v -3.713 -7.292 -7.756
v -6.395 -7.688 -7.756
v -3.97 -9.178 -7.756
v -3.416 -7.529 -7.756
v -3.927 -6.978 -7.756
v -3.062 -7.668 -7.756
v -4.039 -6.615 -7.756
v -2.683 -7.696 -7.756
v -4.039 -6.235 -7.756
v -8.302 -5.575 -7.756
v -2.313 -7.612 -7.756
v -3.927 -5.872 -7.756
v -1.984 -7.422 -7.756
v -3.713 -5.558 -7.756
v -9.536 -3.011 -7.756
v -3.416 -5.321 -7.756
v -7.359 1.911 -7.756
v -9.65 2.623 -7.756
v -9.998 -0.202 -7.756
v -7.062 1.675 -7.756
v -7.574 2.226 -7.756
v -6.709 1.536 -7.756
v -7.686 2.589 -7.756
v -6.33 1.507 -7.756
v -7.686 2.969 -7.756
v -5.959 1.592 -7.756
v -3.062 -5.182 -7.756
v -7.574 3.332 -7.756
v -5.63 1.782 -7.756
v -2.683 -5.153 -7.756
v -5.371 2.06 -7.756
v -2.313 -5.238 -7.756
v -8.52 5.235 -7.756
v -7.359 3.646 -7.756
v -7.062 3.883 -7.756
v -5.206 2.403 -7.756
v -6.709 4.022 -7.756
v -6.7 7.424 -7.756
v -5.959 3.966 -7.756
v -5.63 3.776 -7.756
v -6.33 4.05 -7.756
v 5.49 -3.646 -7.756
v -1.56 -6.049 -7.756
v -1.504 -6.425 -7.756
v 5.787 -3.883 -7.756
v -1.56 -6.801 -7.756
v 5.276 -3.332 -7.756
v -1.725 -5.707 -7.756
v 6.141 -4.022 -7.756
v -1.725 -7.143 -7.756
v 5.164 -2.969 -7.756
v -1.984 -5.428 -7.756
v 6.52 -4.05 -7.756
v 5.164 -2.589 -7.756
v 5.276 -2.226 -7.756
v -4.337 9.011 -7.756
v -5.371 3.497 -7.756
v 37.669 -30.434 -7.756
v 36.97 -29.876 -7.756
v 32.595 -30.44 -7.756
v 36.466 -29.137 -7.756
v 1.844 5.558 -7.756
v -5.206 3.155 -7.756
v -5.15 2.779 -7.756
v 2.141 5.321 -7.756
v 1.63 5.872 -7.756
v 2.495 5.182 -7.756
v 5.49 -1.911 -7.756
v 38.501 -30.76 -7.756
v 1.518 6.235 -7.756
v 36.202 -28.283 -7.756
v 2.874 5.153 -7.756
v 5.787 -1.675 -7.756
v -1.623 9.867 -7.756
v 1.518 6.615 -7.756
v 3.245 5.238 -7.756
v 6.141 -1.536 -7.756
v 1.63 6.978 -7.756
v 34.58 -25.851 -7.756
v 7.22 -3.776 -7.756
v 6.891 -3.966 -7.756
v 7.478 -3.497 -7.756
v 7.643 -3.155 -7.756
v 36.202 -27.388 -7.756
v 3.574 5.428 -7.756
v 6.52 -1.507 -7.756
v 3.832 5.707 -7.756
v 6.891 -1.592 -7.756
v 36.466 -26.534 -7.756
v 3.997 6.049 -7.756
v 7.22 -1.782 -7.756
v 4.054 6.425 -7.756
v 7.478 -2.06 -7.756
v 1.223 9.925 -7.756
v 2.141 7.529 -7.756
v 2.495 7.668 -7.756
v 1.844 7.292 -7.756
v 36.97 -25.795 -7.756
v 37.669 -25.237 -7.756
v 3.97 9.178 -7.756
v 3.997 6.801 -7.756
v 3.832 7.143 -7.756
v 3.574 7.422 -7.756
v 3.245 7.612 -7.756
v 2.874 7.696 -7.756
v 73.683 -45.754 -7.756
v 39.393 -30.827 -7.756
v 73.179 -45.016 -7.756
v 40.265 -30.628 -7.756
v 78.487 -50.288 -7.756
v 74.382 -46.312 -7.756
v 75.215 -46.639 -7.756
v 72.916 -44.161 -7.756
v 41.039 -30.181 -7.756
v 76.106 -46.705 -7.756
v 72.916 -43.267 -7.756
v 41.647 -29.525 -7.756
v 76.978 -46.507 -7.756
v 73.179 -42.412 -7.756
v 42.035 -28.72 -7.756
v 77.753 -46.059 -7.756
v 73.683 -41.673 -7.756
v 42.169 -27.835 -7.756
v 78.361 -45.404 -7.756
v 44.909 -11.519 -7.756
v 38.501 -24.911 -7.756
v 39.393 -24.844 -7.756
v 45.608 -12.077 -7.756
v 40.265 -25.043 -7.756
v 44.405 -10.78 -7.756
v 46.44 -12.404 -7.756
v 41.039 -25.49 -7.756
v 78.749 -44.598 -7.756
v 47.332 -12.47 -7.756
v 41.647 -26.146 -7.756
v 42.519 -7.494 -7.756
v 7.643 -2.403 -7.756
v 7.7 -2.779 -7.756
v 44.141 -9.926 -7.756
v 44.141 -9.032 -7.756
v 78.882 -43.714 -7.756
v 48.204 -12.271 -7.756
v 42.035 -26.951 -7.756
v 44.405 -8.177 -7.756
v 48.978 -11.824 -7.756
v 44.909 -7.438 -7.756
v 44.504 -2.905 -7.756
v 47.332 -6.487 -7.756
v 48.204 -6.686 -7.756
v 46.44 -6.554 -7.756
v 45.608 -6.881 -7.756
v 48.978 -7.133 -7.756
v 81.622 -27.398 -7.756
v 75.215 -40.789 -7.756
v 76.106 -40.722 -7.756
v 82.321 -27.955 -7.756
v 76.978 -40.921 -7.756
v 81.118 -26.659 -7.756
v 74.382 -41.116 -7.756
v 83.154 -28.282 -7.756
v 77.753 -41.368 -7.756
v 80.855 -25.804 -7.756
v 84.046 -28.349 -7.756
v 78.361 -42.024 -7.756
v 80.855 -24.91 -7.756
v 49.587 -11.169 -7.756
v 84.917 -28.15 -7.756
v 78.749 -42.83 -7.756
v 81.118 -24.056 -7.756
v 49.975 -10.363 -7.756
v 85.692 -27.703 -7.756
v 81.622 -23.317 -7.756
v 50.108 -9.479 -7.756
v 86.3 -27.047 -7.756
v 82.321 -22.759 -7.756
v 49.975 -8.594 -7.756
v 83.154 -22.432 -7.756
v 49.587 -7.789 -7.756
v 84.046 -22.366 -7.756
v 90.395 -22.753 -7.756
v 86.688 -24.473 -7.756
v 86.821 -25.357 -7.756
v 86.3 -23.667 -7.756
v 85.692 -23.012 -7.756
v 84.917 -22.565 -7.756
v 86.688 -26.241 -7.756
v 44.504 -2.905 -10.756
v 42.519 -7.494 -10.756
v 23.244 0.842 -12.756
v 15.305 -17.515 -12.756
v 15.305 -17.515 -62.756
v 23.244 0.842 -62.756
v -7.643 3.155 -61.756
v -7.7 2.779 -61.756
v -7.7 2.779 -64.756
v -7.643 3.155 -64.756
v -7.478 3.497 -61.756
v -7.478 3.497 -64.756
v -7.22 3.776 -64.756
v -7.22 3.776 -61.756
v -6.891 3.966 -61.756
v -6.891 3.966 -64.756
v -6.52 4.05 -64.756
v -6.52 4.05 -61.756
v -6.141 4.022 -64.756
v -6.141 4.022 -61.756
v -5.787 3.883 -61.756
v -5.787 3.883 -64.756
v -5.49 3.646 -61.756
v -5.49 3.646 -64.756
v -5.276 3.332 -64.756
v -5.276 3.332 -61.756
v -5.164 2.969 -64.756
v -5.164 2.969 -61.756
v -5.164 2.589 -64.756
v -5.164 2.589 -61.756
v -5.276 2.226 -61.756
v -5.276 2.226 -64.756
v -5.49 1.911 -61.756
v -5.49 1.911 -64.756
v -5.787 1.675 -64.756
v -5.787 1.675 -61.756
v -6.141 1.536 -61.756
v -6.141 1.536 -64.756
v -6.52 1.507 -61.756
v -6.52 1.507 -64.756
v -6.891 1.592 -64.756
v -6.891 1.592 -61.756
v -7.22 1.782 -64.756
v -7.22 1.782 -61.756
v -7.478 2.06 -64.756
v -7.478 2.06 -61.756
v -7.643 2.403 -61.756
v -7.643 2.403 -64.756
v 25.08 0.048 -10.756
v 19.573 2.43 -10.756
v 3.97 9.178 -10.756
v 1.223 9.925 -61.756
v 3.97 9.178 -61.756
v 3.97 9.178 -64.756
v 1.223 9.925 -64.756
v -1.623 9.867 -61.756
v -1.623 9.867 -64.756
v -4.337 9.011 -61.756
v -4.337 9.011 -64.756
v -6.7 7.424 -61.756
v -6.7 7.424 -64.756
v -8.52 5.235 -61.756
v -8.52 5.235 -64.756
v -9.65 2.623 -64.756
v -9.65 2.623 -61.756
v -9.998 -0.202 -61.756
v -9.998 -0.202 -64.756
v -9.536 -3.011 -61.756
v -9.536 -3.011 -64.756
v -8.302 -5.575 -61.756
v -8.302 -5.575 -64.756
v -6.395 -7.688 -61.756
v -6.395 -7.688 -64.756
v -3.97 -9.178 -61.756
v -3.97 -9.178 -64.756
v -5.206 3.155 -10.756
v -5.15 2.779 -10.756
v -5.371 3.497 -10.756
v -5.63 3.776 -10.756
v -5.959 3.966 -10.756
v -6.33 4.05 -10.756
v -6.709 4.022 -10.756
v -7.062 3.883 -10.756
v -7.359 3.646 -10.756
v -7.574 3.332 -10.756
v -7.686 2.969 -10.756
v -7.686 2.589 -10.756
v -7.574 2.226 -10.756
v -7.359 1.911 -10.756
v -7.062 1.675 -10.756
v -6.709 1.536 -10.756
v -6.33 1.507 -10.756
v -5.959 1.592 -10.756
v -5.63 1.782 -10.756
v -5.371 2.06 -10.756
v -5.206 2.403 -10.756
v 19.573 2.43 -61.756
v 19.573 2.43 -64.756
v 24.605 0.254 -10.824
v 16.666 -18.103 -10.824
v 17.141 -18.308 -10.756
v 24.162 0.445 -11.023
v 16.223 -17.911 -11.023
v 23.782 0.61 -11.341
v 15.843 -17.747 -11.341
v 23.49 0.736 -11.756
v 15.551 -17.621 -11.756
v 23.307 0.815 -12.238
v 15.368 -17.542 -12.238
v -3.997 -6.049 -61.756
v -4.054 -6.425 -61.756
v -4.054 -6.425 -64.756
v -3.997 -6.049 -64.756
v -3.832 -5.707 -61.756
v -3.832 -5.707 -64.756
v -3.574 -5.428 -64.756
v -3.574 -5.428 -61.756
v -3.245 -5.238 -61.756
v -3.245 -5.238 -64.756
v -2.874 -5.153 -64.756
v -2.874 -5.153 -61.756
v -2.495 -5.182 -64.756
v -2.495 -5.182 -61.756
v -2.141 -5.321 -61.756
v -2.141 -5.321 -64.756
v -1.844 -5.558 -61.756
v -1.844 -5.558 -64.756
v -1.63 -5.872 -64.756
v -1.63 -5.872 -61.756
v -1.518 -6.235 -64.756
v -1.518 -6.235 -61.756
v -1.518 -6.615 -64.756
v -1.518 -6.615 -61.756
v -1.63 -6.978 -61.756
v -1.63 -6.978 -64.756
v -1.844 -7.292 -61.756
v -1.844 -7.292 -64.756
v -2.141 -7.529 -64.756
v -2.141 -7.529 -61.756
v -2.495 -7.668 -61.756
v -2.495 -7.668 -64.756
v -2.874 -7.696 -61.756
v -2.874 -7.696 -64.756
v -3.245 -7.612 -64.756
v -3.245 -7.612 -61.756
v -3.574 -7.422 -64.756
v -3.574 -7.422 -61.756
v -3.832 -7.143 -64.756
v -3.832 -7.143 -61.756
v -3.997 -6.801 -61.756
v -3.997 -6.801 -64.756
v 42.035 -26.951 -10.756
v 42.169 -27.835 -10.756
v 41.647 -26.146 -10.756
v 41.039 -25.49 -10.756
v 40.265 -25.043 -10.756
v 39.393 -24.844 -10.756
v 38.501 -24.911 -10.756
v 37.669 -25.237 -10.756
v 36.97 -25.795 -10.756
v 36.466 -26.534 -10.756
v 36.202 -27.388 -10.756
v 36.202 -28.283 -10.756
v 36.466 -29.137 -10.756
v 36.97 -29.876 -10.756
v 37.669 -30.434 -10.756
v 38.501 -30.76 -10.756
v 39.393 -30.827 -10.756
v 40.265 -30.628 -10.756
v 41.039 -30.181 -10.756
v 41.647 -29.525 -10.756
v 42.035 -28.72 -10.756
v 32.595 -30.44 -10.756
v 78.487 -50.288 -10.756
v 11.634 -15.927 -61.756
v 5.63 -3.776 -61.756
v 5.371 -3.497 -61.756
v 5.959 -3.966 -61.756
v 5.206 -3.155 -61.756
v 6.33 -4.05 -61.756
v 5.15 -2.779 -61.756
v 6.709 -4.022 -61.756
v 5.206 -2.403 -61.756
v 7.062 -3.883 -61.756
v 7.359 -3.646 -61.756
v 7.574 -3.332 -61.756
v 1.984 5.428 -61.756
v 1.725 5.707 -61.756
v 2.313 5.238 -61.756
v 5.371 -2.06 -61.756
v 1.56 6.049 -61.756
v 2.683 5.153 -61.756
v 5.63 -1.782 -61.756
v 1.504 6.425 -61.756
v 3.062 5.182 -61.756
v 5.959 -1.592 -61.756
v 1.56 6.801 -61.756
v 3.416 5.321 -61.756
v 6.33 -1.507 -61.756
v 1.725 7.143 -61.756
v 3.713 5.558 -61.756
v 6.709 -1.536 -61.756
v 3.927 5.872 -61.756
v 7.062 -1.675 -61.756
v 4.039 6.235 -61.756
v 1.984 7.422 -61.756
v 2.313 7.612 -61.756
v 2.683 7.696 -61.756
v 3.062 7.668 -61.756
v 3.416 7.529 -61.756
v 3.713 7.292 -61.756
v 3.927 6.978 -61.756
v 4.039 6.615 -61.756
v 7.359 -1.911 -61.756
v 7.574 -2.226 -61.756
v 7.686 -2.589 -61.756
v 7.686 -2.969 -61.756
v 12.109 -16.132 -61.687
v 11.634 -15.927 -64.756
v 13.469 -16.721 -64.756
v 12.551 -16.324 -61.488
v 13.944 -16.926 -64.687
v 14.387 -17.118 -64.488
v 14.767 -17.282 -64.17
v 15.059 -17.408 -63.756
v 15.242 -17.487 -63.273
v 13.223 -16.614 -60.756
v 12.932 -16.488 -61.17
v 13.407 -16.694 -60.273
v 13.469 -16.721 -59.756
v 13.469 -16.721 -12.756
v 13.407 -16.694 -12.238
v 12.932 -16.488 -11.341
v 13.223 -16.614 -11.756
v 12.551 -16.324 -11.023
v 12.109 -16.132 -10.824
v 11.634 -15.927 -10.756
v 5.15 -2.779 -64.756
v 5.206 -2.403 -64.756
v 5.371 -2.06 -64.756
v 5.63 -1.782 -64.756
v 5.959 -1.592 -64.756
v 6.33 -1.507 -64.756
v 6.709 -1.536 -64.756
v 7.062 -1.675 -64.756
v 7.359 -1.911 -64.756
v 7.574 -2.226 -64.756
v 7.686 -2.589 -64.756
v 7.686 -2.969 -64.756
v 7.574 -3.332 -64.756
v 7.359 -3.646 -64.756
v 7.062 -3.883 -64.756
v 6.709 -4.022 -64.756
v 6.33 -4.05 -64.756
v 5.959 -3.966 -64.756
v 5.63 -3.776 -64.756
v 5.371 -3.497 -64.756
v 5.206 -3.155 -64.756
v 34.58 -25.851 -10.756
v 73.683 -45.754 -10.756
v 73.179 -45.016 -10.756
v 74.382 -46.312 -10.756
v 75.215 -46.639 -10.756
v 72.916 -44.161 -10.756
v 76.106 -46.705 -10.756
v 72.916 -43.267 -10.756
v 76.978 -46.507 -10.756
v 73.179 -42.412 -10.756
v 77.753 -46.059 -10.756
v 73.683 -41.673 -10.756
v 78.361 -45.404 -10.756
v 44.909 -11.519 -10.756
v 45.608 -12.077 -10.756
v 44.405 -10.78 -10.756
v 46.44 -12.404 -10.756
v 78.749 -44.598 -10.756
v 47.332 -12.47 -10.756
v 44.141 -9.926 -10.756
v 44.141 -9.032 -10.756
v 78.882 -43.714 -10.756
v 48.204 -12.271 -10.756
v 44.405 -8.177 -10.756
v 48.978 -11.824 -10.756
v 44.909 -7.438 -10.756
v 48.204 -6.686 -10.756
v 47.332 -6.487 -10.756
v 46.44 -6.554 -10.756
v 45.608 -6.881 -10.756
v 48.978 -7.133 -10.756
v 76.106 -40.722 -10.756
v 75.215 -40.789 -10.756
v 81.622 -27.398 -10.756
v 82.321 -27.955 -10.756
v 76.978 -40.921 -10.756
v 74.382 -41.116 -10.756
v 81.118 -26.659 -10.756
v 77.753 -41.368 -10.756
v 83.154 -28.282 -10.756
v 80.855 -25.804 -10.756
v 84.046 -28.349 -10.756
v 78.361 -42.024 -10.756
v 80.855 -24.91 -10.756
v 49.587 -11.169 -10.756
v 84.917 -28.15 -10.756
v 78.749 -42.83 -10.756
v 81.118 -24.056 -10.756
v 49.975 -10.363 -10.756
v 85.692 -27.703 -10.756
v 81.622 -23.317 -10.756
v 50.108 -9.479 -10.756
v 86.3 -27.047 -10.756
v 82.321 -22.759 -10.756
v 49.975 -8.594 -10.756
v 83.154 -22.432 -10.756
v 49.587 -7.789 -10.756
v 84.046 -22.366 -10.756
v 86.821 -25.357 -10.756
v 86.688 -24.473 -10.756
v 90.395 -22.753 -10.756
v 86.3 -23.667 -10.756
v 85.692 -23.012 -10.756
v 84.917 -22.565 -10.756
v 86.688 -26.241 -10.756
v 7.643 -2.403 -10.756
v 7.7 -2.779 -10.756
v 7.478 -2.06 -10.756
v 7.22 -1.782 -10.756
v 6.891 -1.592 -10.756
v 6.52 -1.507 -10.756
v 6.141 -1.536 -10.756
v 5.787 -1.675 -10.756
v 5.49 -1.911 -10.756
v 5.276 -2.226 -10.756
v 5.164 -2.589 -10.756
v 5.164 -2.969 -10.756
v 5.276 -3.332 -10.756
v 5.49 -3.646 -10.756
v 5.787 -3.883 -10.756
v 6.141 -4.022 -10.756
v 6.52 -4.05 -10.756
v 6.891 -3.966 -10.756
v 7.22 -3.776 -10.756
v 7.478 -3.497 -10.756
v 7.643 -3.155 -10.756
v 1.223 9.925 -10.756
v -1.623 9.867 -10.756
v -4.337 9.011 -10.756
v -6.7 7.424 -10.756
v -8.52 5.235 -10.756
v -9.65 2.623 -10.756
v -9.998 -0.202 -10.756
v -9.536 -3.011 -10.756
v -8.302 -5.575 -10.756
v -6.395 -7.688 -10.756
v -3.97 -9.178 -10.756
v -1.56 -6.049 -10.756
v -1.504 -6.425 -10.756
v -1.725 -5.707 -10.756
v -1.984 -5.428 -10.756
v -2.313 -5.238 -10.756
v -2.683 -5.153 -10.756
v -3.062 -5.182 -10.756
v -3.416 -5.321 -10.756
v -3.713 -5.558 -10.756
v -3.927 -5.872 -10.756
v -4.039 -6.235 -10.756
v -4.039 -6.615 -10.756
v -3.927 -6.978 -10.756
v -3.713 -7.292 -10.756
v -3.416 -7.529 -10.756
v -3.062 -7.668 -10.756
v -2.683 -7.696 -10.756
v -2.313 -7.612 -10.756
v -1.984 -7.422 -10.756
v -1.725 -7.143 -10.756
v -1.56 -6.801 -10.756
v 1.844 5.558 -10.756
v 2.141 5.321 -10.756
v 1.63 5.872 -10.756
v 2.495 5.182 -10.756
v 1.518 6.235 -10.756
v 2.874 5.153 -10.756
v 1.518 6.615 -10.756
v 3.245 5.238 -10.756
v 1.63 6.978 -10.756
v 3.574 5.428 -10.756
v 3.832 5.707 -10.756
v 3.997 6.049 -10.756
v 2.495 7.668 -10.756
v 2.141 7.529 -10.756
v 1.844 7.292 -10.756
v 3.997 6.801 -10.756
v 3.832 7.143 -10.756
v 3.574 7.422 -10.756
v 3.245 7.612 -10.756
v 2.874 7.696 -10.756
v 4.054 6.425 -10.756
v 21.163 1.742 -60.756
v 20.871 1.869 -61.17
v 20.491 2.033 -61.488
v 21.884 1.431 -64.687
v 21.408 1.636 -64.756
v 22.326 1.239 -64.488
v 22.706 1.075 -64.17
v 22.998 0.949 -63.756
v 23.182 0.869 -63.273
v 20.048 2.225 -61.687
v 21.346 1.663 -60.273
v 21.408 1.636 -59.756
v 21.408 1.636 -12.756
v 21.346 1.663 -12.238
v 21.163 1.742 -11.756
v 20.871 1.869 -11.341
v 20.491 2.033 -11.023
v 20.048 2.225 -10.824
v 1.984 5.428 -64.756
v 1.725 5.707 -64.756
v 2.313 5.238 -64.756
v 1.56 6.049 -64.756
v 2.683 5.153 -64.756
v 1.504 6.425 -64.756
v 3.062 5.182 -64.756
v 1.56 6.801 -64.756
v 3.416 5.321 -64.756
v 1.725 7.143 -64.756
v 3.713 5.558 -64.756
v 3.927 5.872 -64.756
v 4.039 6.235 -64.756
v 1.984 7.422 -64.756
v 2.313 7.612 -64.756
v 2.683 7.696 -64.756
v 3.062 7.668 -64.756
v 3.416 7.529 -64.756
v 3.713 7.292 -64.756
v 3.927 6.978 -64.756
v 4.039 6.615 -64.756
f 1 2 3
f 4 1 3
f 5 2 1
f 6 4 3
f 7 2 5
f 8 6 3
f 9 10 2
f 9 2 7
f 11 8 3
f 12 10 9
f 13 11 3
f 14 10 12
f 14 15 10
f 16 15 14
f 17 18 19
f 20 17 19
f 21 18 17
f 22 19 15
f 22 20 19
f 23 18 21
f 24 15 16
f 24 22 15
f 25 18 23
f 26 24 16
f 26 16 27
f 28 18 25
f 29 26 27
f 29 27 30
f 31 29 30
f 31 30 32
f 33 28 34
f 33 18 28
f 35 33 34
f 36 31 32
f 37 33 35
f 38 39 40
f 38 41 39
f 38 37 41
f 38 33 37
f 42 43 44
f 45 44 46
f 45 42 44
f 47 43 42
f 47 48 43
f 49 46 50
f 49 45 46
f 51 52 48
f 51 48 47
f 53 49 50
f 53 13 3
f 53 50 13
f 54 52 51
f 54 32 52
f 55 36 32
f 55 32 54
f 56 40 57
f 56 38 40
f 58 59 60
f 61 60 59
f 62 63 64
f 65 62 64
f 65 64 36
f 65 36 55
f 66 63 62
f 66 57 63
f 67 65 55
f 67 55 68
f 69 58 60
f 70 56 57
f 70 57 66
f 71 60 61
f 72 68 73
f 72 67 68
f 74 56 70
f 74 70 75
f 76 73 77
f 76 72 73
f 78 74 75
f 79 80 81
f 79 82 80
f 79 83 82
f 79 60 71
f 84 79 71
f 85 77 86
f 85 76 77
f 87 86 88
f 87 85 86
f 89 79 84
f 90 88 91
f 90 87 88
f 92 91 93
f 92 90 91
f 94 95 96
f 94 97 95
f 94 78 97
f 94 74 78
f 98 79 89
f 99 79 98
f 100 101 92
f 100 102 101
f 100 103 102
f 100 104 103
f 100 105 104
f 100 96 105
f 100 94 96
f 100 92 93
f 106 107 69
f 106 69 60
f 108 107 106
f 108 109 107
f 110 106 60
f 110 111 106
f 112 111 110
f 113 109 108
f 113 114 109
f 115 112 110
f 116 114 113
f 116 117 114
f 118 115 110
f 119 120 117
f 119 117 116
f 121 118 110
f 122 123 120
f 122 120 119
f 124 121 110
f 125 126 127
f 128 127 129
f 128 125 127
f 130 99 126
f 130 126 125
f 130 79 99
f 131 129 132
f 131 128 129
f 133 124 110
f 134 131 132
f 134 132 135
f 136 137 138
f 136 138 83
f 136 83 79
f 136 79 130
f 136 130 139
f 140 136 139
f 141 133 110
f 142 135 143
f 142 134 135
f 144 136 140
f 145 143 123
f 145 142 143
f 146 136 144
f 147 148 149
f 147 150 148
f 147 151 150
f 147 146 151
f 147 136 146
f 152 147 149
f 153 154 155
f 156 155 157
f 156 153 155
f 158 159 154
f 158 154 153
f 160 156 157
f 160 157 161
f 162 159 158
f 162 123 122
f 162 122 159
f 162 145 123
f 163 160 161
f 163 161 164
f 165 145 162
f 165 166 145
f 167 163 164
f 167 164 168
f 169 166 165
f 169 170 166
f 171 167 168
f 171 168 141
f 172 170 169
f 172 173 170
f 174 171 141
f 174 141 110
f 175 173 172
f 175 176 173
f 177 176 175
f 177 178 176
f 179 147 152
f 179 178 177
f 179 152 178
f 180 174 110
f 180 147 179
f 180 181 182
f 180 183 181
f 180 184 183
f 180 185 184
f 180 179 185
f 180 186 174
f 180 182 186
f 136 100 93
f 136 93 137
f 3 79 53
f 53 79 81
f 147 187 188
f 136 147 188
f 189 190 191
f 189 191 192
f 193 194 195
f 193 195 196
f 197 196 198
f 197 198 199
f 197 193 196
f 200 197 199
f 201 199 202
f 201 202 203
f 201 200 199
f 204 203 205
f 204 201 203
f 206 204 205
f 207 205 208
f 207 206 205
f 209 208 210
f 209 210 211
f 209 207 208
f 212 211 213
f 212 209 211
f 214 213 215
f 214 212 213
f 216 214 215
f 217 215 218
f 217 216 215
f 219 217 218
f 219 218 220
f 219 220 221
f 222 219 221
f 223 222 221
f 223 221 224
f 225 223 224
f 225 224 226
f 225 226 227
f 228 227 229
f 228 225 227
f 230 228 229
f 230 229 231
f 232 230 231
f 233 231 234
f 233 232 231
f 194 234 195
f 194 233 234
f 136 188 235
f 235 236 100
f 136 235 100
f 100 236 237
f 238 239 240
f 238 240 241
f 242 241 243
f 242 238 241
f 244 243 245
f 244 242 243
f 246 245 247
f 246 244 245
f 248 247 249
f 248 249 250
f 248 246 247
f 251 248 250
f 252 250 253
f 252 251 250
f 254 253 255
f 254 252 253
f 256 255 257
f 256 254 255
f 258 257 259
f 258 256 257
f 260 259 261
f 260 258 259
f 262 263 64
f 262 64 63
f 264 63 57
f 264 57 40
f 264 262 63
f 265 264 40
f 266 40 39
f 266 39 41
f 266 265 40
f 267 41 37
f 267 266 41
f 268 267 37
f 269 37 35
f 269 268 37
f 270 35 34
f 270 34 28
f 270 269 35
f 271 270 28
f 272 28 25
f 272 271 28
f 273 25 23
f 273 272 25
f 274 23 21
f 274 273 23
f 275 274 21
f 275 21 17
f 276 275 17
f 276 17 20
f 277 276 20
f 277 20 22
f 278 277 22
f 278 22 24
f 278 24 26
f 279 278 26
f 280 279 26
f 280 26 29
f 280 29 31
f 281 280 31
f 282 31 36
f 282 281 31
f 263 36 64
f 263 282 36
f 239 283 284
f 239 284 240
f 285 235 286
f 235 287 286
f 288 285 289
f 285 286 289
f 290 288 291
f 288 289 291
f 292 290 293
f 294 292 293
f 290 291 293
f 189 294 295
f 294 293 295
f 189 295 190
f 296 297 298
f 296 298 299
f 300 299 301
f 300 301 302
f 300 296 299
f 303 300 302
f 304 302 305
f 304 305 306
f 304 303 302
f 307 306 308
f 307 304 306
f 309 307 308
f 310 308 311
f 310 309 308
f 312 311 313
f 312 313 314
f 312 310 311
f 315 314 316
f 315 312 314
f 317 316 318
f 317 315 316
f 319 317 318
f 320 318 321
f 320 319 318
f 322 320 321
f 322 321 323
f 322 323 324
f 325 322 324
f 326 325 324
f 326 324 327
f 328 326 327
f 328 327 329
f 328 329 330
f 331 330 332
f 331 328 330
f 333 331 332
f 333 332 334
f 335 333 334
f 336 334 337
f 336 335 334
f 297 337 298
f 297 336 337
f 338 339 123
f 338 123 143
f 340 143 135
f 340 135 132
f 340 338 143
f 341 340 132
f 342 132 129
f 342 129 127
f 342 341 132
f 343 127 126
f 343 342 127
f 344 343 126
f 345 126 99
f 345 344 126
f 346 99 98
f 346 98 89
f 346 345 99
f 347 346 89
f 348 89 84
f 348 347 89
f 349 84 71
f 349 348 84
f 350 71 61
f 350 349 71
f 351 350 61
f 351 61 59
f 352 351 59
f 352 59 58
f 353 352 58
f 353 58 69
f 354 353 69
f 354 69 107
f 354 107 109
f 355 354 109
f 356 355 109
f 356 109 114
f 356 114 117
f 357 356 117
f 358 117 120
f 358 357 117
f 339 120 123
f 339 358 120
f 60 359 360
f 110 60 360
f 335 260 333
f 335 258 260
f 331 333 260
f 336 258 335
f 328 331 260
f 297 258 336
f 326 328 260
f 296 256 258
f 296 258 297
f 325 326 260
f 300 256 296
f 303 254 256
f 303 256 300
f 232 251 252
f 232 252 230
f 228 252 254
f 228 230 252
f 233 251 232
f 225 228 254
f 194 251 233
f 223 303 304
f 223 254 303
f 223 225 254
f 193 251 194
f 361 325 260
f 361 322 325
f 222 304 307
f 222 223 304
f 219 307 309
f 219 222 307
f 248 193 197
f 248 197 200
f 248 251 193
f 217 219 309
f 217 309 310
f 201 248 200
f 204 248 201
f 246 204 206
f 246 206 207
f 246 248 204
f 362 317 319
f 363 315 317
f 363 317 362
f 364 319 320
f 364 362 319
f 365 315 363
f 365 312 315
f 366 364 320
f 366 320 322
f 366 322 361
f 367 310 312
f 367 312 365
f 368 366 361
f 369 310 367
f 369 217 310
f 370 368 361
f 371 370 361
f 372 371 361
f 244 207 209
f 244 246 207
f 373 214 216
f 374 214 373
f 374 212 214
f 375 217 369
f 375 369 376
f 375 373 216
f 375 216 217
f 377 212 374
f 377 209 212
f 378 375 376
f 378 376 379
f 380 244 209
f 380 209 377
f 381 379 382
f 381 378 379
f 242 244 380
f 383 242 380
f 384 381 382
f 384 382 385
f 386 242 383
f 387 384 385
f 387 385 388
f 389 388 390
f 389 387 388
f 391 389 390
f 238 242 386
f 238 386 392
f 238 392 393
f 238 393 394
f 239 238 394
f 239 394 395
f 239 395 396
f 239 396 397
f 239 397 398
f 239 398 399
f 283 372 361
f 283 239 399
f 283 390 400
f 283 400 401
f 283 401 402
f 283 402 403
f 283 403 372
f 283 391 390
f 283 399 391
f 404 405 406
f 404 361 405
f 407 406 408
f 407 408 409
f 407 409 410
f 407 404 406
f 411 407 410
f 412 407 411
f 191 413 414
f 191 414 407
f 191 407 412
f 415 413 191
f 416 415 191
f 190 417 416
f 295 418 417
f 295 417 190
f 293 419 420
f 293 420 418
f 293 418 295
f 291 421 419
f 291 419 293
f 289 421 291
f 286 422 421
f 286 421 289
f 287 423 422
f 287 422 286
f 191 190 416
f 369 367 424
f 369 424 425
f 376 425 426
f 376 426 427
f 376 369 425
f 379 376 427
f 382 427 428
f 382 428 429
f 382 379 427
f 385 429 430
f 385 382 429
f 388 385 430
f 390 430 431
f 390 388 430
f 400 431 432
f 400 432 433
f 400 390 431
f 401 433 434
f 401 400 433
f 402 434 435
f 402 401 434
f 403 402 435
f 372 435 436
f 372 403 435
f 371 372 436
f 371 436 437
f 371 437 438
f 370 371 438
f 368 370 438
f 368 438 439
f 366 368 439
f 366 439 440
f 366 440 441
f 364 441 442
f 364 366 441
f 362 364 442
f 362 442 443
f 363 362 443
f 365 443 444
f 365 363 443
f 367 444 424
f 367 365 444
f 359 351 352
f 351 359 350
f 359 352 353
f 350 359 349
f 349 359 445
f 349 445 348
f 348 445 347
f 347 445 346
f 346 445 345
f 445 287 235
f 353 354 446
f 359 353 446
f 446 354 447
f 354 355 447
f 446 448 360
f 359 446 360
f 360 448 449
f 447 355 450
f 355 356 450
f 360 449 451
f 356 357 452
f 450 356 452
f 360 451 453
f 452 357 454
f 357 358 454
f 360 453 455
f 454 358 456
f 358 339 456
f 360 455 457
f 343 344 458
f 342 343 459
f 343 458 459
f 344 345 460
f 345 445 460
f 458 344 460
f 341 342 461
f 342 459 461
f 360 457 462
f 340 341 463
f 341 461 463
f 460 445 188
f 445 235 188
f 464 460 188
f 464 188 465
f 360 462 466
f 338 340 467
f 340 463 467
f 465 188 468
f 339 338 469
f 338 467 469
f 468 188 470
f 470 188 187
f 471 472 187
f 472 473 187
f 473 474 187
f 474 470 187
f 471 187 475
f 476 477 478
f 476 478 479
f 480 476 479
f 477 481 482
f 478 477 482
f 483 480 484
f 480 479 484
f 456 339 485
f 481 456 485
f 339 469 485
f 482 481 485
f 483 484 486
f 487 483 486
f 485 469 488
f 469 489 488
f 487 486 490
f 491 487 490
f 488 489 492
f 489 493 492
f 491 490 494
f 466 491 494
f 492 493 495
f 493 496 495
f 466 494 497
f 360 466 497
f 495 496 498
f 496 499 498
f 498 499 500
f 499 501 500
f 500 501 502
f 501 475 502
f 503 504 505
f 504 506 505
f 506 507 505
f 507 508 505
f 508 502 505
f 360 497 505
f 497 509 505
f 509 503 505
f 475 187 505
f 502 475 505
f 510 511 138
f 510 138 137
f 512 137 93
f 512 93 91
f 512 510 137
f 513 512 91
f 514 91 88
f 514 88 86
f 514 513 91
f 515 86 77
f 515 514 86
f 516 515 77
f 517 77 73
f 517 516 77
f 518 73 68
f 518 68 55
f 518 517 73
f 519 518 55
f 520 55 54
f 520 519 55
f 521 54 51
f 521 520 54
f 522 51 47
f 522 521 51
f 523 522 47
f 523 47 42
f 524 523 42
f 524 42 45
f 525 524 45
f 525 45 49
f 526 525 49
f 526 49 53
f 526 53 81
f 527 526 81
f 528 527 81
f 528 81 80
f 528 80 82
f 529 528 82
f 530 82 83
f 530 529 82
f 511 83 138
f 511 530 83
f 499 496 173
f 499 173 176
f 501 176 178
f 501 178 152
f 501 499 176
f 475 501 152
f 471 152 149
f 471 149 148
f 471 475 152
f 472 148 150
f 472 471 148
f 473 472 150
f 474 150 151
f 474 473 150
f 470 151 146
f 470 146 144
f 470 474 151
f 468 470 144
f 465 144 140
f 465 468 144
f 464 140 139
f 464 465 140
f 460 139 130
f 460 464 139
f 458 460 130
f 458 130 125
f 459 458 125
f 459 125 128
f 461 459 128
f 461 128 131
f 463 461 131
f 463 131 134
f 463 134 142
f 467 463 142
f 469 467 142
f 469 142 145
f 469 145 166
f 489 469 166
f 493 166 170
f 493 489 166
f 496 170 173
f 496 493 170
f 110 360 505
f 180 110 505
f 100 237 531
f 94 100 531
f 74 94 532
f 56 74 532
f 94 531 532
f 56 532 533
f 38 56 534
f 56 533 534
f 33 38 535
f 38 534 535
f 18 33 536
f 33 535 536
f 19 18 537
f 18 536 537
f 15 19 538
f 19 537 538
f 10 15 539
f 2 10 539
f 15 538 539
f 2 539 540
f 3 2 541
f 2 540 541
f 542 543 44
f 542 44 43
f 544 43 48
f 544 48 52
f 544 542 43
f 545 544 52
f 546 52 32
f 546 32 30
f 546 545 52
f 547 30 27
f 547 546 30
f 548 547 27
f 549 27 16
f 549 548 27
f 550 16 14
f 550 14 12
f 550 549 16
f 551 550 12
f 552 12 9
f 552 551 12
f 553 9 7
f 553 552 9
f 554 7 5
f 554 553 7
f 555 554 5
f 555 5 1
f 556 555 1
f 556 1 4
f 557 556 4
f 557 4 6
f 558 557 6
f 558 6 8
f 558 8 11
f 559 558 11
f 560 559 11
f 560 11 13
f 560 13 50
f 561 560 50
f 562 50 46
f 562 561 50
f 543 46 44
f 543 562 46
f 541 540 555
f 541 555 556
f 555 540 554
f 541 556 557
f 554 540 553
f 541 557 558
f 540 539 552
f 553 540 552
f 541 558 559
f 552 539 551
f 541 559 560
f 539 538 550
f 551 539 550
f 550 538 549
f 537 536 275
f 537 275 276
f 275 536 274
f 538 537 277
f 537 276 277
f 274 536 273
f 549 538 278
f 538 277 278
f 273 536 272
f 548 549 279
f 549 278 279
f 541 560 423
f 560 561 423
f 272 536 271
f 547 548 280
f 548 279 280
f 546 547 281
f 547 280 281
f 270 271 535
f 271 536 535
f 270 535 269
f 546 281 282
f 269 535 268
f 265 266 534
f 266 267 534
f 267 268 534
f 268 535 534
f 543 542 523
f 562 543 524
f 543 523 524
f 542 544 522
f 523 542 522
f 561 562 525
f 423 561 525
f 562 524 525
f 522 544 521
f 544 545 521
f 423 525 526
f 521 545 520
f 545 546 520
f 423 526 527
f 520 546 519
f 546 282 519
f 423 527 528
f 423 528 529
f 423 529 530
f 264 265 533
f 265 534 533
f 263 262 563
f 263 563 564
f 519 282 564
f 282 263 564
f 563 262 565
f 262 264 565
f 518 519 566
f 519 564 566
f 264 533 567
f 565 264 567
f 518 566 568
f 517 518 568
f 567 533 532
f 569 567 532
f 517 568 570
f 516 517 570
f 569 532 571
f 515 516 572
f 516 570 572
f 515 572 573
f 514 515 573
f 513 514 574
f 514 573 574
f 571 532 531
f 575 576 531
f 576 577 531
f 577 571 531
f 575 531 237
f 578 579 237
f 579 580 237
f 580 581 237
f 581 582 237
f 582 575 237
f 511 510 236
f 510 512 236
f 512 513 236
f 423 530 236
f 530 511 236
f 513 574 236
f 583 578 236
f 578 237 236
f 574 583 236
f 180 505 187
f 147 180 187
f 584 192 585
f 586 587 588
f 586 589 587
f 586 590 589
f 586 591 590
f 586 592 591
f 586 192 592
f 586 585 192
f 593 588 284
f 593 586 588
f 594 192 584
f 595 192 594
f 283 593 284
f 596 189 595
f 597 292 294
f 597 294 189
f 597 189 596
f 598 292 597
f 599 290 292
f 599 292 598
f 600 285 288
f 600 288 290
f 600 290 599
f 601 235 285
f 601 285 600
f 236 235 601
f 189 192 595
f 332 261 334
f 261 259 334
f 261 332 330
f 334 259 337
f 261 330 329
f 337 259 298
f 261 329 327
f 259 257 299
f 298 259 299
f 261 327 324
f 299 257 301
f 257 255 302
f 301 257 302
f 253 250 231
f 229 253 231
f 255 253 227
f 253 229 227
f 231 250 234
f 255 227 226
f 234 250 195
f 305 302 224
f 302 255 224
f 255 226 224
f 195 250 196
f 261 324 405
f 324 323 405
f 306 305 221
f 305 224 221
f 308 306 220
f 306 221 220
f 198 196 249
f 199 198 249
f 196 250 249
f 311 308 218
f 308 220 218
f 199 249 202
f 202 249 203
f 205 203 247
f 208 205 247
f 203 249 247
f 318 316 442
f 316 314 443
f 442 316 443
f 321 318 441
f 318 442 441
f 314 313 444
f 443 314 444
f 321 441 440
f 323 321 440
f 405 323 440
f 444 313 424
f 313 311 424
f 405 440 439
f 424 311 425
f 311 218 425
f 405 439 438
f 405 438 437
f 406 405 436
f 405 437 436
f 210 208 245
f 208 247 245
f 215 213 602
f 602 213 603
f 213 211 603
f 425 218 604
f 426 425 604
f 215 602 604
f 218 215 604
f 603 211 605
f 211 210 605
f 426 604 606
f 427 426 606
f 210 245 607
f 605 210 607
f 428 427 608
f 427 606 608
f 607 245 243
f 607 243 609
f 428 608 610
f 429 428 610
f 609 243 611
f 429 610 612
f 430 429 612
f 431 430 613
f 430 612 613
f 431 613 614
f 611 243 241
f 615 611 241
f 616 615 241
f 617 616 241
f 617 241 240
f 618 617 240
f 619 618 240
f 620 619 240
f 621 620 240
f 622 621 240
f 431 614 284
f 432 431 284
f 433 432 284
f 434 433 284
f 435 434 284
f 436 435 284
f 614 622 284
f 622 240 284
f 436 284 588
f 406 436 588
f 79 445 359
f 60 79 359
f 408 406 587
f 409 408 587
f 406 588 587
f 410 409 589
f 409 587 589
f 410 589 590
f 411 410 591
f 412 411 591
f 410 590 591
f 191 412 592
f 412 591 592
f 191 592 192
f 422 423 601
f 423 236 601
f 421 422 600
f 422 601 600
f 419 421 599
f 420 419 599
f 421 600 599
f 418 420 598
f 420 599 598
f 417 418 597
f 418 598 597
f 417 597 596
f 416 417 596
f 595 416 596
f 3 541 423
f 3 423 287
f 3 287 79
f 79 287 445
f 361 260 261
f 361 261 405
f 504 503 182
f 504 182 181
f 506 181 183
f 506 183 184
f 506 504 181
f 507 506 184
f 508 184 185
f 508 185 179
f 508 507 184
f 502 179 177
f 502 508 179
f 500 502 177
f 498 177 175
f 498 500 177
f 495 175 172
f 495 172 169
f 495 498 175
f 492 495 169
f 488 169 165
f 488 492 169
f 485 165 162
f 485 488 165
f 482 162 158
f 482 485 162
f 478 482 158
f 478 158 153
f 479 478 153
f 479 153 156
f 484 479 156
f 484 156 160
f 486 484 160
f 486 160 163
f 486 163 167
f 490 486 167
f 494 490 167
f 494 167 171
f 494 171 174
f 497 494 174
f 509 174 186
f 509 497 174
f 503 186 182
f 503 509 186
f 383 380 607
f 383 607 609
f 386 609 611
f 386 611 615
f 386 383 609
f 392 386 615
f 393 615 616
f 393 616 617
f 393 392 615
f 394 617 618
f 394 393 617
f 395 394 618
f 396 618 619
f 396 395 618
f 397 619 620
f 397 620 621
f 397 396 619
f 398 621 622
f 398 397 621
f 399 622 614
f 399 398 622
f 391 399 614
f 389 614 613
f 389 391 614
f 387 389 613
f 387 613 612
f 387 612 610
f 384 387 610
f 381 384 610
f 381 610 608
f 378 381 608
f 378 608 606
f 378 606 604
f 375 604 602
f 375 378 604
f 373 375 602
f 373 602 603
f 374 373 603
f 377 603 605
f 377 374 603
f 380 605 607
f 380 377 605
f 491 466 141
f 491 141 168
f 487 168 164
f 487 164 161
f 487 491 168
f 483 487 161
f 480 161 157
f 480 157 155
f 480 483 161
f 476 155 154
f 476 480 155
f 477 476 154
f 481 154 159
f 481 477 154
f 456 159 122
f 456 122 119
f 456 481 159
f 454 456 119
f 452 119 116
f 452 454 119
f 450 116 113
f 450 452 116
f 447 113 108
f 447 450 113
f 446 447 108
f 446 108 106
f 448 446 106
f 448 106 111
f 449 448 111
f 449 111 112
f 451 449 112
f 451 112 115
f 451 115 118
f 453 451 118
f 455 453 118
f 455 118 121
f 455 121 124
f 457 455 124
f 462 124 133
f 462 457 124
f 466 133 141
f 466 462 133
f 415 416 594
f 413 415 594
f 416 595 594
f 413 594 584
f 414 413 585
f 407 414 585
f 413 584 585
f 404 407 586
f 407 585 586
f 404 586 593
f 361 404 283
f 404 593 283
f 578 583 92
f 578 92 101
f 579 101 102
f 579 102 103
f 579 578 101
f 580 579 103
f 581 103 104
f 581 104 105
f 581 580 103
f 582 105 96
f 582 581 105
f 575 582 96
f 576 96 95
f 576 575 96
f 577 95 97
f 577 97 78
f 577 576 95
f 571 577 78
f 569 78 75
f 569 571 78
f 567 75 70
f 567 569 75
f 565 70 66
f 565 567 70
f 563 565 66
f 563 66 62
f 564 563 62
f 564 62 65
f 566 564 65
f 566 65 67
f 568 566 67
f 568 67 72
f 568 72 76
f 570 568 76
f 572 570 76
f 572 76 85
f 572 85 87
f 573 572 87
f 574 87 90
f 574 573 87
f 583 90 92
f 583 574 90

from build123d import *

# Parameters (mm, degrees)
ESQUISSE2_R        = 1.275
ESQUISSE2_R_2      = 3
BOSS_EXTRU_1_DEPTH = 3
BOSS_EXTRU_4_DEPTH = 51
CONG_1_R           = 2
ESQUISSE6_R        = 1.275
BOSS_EXTRU_5_DEPTH = 3
CONG_2_R           = 2


with BuildPart() as part:
    # Esquisse2 → Boss.-Extru.1 (new body)
    with BuildSketch(Plane.XY.offset(-10.755524)):
        with BuildLine():
            Line((42.518708, -7.493961), (3.9696, 9.178359))
            ThreePointArc((3.9696, 9.178359), (-9.178359, 3.9696), (-3.9696, -9.178359))
            Line((-3.9696, -9.178359), (34.579508, -25.850679))
            Line((34.579508, -25.850679), (32.594708, -30.439859))
            Line((32.594708, -30.439859), (78.486504, -50.287859))
            Line((78.486504, -50.287859), (90.395304, -22.752781))
            Line((90.395304, -22.752781), (44.503508, -2.904781))
            Line((44.503508, -2.904781), (42.518708, -7.493961))
        make_face()
        with Locations((6.424851, -2.77872)):
            Circle(ESQUISSE2_R, mode=Mode.SUBTRACT)
        with Locations((-2.77872, -6.424851)):
            Circle(ESQUISSE2_R, mode=Mode.SUBTRACT)
        with Locations((-6.424851, 2.77872)):
            Circle(ESQUISSE2_R, mode=Mode.SUBTRACT)
        with Locations((2.77872, 6.424851)):
            Circle(ESQUISSE2_R, mode=Mode.SUBTRACT)
        with Locations((75.882124, -43.713879)):
            Circle(ESQUISSE2_R_2, mode=Mode.SUBTRACT)
        with Locations((83.821324, -25.357161)):
            Circle(ESQUISSE2_R_2, mode=Mode.SUBTRACT)
        with Locations((47.107888, -9.478761)):
            Circle(ESQUISSE2_R_2, mode=Mode.SUBTRACT)
        with Locations((39.168688, -27.835479)):
            Circle(ESQUISSE2_R_2, mode=Mode.SUBTRACT)
    extrude(amount=BOSS_EXTRU_1_DEPTH)

    # Esquisse5 → Boss.-Extru.4 (add)
    with BuildSketch(Plane(origin=(0, 0, -10.755524), x_dir=(-1, 0, 0), z_dir=(0, 0, -1))):
        Polygon((-13.469282, -16.720599), (-21.408482, 1.636119), (-23.244154, 0.842199), (-15.304954, -17.514519), align=None)
    extrude(amount=BOSS_EXTRU_4_DEPTH)

    # Congé1
    cong_1_edges = [part.edges().sort_by_distance(p)[0] for p in [
        (19.274554, -8.33616, -10.755524),
        (17.438882, -7.54224, -10.755524),
    ]]
    fillet(cong_1_edges, radius=CONG_1_R)

    # Esquisse6 → Boss.-Extru.5 (add)
    with BuildSketch(Plane(origin=(0, 0, -61.755524), x_dir=(-1, 0, 0), z_dir=(0, 0, -1))):
        with BuildLine():
            Line((3.9696, -9.178359), (-11.63361, -15.926679))
            Line((-11.63361, -15.926679), (-15.304954, -17.514519))
            Line((-15.304954, -17.514519), (-23.244154, 0.842199))
            Line((-23.244154, 0.842199), (-19.57281, 2.430039))
            Line((-19.57281, 2.430039), (-3.9696, 9.178359))
            ThreePointArc((-3.9696, 9.178359), (9.178359, 3.9696), (3.9696, -9.178359))
        make_face()
        with Locations((6.424851, 2.77872)):
            Circle(ESQUISSE6_R, mode=Mode.SUBTRACT)
        with Locations((-2.77872, 6.424851)):
            Circle(ESQUISSE6_R, mode=Mode.SUBTRACT)
        with Locations((-6.424851, -2.77872)):
            Circle(ESQUISSE6_R, mode=Mode.SUBTRACT)
        with Locations((2.77872, -6.424851)):
            Circle(ESQUISSE6_R, mode=Mode.SUBTRACT)
    extrude(amount=BOSS_EXTRU_5_DEPTH)

    # Congé2
    cong_2_edges = [part.edges().sort_by_distance(p)[0] for p in [
        (17.438882, -7.54224, -61.755524),
        (19.274554, -8.33616, -64.755524),
    ]]
    fillet(cong_2_edges, radius=CONG_2_R)


solid = part.part
